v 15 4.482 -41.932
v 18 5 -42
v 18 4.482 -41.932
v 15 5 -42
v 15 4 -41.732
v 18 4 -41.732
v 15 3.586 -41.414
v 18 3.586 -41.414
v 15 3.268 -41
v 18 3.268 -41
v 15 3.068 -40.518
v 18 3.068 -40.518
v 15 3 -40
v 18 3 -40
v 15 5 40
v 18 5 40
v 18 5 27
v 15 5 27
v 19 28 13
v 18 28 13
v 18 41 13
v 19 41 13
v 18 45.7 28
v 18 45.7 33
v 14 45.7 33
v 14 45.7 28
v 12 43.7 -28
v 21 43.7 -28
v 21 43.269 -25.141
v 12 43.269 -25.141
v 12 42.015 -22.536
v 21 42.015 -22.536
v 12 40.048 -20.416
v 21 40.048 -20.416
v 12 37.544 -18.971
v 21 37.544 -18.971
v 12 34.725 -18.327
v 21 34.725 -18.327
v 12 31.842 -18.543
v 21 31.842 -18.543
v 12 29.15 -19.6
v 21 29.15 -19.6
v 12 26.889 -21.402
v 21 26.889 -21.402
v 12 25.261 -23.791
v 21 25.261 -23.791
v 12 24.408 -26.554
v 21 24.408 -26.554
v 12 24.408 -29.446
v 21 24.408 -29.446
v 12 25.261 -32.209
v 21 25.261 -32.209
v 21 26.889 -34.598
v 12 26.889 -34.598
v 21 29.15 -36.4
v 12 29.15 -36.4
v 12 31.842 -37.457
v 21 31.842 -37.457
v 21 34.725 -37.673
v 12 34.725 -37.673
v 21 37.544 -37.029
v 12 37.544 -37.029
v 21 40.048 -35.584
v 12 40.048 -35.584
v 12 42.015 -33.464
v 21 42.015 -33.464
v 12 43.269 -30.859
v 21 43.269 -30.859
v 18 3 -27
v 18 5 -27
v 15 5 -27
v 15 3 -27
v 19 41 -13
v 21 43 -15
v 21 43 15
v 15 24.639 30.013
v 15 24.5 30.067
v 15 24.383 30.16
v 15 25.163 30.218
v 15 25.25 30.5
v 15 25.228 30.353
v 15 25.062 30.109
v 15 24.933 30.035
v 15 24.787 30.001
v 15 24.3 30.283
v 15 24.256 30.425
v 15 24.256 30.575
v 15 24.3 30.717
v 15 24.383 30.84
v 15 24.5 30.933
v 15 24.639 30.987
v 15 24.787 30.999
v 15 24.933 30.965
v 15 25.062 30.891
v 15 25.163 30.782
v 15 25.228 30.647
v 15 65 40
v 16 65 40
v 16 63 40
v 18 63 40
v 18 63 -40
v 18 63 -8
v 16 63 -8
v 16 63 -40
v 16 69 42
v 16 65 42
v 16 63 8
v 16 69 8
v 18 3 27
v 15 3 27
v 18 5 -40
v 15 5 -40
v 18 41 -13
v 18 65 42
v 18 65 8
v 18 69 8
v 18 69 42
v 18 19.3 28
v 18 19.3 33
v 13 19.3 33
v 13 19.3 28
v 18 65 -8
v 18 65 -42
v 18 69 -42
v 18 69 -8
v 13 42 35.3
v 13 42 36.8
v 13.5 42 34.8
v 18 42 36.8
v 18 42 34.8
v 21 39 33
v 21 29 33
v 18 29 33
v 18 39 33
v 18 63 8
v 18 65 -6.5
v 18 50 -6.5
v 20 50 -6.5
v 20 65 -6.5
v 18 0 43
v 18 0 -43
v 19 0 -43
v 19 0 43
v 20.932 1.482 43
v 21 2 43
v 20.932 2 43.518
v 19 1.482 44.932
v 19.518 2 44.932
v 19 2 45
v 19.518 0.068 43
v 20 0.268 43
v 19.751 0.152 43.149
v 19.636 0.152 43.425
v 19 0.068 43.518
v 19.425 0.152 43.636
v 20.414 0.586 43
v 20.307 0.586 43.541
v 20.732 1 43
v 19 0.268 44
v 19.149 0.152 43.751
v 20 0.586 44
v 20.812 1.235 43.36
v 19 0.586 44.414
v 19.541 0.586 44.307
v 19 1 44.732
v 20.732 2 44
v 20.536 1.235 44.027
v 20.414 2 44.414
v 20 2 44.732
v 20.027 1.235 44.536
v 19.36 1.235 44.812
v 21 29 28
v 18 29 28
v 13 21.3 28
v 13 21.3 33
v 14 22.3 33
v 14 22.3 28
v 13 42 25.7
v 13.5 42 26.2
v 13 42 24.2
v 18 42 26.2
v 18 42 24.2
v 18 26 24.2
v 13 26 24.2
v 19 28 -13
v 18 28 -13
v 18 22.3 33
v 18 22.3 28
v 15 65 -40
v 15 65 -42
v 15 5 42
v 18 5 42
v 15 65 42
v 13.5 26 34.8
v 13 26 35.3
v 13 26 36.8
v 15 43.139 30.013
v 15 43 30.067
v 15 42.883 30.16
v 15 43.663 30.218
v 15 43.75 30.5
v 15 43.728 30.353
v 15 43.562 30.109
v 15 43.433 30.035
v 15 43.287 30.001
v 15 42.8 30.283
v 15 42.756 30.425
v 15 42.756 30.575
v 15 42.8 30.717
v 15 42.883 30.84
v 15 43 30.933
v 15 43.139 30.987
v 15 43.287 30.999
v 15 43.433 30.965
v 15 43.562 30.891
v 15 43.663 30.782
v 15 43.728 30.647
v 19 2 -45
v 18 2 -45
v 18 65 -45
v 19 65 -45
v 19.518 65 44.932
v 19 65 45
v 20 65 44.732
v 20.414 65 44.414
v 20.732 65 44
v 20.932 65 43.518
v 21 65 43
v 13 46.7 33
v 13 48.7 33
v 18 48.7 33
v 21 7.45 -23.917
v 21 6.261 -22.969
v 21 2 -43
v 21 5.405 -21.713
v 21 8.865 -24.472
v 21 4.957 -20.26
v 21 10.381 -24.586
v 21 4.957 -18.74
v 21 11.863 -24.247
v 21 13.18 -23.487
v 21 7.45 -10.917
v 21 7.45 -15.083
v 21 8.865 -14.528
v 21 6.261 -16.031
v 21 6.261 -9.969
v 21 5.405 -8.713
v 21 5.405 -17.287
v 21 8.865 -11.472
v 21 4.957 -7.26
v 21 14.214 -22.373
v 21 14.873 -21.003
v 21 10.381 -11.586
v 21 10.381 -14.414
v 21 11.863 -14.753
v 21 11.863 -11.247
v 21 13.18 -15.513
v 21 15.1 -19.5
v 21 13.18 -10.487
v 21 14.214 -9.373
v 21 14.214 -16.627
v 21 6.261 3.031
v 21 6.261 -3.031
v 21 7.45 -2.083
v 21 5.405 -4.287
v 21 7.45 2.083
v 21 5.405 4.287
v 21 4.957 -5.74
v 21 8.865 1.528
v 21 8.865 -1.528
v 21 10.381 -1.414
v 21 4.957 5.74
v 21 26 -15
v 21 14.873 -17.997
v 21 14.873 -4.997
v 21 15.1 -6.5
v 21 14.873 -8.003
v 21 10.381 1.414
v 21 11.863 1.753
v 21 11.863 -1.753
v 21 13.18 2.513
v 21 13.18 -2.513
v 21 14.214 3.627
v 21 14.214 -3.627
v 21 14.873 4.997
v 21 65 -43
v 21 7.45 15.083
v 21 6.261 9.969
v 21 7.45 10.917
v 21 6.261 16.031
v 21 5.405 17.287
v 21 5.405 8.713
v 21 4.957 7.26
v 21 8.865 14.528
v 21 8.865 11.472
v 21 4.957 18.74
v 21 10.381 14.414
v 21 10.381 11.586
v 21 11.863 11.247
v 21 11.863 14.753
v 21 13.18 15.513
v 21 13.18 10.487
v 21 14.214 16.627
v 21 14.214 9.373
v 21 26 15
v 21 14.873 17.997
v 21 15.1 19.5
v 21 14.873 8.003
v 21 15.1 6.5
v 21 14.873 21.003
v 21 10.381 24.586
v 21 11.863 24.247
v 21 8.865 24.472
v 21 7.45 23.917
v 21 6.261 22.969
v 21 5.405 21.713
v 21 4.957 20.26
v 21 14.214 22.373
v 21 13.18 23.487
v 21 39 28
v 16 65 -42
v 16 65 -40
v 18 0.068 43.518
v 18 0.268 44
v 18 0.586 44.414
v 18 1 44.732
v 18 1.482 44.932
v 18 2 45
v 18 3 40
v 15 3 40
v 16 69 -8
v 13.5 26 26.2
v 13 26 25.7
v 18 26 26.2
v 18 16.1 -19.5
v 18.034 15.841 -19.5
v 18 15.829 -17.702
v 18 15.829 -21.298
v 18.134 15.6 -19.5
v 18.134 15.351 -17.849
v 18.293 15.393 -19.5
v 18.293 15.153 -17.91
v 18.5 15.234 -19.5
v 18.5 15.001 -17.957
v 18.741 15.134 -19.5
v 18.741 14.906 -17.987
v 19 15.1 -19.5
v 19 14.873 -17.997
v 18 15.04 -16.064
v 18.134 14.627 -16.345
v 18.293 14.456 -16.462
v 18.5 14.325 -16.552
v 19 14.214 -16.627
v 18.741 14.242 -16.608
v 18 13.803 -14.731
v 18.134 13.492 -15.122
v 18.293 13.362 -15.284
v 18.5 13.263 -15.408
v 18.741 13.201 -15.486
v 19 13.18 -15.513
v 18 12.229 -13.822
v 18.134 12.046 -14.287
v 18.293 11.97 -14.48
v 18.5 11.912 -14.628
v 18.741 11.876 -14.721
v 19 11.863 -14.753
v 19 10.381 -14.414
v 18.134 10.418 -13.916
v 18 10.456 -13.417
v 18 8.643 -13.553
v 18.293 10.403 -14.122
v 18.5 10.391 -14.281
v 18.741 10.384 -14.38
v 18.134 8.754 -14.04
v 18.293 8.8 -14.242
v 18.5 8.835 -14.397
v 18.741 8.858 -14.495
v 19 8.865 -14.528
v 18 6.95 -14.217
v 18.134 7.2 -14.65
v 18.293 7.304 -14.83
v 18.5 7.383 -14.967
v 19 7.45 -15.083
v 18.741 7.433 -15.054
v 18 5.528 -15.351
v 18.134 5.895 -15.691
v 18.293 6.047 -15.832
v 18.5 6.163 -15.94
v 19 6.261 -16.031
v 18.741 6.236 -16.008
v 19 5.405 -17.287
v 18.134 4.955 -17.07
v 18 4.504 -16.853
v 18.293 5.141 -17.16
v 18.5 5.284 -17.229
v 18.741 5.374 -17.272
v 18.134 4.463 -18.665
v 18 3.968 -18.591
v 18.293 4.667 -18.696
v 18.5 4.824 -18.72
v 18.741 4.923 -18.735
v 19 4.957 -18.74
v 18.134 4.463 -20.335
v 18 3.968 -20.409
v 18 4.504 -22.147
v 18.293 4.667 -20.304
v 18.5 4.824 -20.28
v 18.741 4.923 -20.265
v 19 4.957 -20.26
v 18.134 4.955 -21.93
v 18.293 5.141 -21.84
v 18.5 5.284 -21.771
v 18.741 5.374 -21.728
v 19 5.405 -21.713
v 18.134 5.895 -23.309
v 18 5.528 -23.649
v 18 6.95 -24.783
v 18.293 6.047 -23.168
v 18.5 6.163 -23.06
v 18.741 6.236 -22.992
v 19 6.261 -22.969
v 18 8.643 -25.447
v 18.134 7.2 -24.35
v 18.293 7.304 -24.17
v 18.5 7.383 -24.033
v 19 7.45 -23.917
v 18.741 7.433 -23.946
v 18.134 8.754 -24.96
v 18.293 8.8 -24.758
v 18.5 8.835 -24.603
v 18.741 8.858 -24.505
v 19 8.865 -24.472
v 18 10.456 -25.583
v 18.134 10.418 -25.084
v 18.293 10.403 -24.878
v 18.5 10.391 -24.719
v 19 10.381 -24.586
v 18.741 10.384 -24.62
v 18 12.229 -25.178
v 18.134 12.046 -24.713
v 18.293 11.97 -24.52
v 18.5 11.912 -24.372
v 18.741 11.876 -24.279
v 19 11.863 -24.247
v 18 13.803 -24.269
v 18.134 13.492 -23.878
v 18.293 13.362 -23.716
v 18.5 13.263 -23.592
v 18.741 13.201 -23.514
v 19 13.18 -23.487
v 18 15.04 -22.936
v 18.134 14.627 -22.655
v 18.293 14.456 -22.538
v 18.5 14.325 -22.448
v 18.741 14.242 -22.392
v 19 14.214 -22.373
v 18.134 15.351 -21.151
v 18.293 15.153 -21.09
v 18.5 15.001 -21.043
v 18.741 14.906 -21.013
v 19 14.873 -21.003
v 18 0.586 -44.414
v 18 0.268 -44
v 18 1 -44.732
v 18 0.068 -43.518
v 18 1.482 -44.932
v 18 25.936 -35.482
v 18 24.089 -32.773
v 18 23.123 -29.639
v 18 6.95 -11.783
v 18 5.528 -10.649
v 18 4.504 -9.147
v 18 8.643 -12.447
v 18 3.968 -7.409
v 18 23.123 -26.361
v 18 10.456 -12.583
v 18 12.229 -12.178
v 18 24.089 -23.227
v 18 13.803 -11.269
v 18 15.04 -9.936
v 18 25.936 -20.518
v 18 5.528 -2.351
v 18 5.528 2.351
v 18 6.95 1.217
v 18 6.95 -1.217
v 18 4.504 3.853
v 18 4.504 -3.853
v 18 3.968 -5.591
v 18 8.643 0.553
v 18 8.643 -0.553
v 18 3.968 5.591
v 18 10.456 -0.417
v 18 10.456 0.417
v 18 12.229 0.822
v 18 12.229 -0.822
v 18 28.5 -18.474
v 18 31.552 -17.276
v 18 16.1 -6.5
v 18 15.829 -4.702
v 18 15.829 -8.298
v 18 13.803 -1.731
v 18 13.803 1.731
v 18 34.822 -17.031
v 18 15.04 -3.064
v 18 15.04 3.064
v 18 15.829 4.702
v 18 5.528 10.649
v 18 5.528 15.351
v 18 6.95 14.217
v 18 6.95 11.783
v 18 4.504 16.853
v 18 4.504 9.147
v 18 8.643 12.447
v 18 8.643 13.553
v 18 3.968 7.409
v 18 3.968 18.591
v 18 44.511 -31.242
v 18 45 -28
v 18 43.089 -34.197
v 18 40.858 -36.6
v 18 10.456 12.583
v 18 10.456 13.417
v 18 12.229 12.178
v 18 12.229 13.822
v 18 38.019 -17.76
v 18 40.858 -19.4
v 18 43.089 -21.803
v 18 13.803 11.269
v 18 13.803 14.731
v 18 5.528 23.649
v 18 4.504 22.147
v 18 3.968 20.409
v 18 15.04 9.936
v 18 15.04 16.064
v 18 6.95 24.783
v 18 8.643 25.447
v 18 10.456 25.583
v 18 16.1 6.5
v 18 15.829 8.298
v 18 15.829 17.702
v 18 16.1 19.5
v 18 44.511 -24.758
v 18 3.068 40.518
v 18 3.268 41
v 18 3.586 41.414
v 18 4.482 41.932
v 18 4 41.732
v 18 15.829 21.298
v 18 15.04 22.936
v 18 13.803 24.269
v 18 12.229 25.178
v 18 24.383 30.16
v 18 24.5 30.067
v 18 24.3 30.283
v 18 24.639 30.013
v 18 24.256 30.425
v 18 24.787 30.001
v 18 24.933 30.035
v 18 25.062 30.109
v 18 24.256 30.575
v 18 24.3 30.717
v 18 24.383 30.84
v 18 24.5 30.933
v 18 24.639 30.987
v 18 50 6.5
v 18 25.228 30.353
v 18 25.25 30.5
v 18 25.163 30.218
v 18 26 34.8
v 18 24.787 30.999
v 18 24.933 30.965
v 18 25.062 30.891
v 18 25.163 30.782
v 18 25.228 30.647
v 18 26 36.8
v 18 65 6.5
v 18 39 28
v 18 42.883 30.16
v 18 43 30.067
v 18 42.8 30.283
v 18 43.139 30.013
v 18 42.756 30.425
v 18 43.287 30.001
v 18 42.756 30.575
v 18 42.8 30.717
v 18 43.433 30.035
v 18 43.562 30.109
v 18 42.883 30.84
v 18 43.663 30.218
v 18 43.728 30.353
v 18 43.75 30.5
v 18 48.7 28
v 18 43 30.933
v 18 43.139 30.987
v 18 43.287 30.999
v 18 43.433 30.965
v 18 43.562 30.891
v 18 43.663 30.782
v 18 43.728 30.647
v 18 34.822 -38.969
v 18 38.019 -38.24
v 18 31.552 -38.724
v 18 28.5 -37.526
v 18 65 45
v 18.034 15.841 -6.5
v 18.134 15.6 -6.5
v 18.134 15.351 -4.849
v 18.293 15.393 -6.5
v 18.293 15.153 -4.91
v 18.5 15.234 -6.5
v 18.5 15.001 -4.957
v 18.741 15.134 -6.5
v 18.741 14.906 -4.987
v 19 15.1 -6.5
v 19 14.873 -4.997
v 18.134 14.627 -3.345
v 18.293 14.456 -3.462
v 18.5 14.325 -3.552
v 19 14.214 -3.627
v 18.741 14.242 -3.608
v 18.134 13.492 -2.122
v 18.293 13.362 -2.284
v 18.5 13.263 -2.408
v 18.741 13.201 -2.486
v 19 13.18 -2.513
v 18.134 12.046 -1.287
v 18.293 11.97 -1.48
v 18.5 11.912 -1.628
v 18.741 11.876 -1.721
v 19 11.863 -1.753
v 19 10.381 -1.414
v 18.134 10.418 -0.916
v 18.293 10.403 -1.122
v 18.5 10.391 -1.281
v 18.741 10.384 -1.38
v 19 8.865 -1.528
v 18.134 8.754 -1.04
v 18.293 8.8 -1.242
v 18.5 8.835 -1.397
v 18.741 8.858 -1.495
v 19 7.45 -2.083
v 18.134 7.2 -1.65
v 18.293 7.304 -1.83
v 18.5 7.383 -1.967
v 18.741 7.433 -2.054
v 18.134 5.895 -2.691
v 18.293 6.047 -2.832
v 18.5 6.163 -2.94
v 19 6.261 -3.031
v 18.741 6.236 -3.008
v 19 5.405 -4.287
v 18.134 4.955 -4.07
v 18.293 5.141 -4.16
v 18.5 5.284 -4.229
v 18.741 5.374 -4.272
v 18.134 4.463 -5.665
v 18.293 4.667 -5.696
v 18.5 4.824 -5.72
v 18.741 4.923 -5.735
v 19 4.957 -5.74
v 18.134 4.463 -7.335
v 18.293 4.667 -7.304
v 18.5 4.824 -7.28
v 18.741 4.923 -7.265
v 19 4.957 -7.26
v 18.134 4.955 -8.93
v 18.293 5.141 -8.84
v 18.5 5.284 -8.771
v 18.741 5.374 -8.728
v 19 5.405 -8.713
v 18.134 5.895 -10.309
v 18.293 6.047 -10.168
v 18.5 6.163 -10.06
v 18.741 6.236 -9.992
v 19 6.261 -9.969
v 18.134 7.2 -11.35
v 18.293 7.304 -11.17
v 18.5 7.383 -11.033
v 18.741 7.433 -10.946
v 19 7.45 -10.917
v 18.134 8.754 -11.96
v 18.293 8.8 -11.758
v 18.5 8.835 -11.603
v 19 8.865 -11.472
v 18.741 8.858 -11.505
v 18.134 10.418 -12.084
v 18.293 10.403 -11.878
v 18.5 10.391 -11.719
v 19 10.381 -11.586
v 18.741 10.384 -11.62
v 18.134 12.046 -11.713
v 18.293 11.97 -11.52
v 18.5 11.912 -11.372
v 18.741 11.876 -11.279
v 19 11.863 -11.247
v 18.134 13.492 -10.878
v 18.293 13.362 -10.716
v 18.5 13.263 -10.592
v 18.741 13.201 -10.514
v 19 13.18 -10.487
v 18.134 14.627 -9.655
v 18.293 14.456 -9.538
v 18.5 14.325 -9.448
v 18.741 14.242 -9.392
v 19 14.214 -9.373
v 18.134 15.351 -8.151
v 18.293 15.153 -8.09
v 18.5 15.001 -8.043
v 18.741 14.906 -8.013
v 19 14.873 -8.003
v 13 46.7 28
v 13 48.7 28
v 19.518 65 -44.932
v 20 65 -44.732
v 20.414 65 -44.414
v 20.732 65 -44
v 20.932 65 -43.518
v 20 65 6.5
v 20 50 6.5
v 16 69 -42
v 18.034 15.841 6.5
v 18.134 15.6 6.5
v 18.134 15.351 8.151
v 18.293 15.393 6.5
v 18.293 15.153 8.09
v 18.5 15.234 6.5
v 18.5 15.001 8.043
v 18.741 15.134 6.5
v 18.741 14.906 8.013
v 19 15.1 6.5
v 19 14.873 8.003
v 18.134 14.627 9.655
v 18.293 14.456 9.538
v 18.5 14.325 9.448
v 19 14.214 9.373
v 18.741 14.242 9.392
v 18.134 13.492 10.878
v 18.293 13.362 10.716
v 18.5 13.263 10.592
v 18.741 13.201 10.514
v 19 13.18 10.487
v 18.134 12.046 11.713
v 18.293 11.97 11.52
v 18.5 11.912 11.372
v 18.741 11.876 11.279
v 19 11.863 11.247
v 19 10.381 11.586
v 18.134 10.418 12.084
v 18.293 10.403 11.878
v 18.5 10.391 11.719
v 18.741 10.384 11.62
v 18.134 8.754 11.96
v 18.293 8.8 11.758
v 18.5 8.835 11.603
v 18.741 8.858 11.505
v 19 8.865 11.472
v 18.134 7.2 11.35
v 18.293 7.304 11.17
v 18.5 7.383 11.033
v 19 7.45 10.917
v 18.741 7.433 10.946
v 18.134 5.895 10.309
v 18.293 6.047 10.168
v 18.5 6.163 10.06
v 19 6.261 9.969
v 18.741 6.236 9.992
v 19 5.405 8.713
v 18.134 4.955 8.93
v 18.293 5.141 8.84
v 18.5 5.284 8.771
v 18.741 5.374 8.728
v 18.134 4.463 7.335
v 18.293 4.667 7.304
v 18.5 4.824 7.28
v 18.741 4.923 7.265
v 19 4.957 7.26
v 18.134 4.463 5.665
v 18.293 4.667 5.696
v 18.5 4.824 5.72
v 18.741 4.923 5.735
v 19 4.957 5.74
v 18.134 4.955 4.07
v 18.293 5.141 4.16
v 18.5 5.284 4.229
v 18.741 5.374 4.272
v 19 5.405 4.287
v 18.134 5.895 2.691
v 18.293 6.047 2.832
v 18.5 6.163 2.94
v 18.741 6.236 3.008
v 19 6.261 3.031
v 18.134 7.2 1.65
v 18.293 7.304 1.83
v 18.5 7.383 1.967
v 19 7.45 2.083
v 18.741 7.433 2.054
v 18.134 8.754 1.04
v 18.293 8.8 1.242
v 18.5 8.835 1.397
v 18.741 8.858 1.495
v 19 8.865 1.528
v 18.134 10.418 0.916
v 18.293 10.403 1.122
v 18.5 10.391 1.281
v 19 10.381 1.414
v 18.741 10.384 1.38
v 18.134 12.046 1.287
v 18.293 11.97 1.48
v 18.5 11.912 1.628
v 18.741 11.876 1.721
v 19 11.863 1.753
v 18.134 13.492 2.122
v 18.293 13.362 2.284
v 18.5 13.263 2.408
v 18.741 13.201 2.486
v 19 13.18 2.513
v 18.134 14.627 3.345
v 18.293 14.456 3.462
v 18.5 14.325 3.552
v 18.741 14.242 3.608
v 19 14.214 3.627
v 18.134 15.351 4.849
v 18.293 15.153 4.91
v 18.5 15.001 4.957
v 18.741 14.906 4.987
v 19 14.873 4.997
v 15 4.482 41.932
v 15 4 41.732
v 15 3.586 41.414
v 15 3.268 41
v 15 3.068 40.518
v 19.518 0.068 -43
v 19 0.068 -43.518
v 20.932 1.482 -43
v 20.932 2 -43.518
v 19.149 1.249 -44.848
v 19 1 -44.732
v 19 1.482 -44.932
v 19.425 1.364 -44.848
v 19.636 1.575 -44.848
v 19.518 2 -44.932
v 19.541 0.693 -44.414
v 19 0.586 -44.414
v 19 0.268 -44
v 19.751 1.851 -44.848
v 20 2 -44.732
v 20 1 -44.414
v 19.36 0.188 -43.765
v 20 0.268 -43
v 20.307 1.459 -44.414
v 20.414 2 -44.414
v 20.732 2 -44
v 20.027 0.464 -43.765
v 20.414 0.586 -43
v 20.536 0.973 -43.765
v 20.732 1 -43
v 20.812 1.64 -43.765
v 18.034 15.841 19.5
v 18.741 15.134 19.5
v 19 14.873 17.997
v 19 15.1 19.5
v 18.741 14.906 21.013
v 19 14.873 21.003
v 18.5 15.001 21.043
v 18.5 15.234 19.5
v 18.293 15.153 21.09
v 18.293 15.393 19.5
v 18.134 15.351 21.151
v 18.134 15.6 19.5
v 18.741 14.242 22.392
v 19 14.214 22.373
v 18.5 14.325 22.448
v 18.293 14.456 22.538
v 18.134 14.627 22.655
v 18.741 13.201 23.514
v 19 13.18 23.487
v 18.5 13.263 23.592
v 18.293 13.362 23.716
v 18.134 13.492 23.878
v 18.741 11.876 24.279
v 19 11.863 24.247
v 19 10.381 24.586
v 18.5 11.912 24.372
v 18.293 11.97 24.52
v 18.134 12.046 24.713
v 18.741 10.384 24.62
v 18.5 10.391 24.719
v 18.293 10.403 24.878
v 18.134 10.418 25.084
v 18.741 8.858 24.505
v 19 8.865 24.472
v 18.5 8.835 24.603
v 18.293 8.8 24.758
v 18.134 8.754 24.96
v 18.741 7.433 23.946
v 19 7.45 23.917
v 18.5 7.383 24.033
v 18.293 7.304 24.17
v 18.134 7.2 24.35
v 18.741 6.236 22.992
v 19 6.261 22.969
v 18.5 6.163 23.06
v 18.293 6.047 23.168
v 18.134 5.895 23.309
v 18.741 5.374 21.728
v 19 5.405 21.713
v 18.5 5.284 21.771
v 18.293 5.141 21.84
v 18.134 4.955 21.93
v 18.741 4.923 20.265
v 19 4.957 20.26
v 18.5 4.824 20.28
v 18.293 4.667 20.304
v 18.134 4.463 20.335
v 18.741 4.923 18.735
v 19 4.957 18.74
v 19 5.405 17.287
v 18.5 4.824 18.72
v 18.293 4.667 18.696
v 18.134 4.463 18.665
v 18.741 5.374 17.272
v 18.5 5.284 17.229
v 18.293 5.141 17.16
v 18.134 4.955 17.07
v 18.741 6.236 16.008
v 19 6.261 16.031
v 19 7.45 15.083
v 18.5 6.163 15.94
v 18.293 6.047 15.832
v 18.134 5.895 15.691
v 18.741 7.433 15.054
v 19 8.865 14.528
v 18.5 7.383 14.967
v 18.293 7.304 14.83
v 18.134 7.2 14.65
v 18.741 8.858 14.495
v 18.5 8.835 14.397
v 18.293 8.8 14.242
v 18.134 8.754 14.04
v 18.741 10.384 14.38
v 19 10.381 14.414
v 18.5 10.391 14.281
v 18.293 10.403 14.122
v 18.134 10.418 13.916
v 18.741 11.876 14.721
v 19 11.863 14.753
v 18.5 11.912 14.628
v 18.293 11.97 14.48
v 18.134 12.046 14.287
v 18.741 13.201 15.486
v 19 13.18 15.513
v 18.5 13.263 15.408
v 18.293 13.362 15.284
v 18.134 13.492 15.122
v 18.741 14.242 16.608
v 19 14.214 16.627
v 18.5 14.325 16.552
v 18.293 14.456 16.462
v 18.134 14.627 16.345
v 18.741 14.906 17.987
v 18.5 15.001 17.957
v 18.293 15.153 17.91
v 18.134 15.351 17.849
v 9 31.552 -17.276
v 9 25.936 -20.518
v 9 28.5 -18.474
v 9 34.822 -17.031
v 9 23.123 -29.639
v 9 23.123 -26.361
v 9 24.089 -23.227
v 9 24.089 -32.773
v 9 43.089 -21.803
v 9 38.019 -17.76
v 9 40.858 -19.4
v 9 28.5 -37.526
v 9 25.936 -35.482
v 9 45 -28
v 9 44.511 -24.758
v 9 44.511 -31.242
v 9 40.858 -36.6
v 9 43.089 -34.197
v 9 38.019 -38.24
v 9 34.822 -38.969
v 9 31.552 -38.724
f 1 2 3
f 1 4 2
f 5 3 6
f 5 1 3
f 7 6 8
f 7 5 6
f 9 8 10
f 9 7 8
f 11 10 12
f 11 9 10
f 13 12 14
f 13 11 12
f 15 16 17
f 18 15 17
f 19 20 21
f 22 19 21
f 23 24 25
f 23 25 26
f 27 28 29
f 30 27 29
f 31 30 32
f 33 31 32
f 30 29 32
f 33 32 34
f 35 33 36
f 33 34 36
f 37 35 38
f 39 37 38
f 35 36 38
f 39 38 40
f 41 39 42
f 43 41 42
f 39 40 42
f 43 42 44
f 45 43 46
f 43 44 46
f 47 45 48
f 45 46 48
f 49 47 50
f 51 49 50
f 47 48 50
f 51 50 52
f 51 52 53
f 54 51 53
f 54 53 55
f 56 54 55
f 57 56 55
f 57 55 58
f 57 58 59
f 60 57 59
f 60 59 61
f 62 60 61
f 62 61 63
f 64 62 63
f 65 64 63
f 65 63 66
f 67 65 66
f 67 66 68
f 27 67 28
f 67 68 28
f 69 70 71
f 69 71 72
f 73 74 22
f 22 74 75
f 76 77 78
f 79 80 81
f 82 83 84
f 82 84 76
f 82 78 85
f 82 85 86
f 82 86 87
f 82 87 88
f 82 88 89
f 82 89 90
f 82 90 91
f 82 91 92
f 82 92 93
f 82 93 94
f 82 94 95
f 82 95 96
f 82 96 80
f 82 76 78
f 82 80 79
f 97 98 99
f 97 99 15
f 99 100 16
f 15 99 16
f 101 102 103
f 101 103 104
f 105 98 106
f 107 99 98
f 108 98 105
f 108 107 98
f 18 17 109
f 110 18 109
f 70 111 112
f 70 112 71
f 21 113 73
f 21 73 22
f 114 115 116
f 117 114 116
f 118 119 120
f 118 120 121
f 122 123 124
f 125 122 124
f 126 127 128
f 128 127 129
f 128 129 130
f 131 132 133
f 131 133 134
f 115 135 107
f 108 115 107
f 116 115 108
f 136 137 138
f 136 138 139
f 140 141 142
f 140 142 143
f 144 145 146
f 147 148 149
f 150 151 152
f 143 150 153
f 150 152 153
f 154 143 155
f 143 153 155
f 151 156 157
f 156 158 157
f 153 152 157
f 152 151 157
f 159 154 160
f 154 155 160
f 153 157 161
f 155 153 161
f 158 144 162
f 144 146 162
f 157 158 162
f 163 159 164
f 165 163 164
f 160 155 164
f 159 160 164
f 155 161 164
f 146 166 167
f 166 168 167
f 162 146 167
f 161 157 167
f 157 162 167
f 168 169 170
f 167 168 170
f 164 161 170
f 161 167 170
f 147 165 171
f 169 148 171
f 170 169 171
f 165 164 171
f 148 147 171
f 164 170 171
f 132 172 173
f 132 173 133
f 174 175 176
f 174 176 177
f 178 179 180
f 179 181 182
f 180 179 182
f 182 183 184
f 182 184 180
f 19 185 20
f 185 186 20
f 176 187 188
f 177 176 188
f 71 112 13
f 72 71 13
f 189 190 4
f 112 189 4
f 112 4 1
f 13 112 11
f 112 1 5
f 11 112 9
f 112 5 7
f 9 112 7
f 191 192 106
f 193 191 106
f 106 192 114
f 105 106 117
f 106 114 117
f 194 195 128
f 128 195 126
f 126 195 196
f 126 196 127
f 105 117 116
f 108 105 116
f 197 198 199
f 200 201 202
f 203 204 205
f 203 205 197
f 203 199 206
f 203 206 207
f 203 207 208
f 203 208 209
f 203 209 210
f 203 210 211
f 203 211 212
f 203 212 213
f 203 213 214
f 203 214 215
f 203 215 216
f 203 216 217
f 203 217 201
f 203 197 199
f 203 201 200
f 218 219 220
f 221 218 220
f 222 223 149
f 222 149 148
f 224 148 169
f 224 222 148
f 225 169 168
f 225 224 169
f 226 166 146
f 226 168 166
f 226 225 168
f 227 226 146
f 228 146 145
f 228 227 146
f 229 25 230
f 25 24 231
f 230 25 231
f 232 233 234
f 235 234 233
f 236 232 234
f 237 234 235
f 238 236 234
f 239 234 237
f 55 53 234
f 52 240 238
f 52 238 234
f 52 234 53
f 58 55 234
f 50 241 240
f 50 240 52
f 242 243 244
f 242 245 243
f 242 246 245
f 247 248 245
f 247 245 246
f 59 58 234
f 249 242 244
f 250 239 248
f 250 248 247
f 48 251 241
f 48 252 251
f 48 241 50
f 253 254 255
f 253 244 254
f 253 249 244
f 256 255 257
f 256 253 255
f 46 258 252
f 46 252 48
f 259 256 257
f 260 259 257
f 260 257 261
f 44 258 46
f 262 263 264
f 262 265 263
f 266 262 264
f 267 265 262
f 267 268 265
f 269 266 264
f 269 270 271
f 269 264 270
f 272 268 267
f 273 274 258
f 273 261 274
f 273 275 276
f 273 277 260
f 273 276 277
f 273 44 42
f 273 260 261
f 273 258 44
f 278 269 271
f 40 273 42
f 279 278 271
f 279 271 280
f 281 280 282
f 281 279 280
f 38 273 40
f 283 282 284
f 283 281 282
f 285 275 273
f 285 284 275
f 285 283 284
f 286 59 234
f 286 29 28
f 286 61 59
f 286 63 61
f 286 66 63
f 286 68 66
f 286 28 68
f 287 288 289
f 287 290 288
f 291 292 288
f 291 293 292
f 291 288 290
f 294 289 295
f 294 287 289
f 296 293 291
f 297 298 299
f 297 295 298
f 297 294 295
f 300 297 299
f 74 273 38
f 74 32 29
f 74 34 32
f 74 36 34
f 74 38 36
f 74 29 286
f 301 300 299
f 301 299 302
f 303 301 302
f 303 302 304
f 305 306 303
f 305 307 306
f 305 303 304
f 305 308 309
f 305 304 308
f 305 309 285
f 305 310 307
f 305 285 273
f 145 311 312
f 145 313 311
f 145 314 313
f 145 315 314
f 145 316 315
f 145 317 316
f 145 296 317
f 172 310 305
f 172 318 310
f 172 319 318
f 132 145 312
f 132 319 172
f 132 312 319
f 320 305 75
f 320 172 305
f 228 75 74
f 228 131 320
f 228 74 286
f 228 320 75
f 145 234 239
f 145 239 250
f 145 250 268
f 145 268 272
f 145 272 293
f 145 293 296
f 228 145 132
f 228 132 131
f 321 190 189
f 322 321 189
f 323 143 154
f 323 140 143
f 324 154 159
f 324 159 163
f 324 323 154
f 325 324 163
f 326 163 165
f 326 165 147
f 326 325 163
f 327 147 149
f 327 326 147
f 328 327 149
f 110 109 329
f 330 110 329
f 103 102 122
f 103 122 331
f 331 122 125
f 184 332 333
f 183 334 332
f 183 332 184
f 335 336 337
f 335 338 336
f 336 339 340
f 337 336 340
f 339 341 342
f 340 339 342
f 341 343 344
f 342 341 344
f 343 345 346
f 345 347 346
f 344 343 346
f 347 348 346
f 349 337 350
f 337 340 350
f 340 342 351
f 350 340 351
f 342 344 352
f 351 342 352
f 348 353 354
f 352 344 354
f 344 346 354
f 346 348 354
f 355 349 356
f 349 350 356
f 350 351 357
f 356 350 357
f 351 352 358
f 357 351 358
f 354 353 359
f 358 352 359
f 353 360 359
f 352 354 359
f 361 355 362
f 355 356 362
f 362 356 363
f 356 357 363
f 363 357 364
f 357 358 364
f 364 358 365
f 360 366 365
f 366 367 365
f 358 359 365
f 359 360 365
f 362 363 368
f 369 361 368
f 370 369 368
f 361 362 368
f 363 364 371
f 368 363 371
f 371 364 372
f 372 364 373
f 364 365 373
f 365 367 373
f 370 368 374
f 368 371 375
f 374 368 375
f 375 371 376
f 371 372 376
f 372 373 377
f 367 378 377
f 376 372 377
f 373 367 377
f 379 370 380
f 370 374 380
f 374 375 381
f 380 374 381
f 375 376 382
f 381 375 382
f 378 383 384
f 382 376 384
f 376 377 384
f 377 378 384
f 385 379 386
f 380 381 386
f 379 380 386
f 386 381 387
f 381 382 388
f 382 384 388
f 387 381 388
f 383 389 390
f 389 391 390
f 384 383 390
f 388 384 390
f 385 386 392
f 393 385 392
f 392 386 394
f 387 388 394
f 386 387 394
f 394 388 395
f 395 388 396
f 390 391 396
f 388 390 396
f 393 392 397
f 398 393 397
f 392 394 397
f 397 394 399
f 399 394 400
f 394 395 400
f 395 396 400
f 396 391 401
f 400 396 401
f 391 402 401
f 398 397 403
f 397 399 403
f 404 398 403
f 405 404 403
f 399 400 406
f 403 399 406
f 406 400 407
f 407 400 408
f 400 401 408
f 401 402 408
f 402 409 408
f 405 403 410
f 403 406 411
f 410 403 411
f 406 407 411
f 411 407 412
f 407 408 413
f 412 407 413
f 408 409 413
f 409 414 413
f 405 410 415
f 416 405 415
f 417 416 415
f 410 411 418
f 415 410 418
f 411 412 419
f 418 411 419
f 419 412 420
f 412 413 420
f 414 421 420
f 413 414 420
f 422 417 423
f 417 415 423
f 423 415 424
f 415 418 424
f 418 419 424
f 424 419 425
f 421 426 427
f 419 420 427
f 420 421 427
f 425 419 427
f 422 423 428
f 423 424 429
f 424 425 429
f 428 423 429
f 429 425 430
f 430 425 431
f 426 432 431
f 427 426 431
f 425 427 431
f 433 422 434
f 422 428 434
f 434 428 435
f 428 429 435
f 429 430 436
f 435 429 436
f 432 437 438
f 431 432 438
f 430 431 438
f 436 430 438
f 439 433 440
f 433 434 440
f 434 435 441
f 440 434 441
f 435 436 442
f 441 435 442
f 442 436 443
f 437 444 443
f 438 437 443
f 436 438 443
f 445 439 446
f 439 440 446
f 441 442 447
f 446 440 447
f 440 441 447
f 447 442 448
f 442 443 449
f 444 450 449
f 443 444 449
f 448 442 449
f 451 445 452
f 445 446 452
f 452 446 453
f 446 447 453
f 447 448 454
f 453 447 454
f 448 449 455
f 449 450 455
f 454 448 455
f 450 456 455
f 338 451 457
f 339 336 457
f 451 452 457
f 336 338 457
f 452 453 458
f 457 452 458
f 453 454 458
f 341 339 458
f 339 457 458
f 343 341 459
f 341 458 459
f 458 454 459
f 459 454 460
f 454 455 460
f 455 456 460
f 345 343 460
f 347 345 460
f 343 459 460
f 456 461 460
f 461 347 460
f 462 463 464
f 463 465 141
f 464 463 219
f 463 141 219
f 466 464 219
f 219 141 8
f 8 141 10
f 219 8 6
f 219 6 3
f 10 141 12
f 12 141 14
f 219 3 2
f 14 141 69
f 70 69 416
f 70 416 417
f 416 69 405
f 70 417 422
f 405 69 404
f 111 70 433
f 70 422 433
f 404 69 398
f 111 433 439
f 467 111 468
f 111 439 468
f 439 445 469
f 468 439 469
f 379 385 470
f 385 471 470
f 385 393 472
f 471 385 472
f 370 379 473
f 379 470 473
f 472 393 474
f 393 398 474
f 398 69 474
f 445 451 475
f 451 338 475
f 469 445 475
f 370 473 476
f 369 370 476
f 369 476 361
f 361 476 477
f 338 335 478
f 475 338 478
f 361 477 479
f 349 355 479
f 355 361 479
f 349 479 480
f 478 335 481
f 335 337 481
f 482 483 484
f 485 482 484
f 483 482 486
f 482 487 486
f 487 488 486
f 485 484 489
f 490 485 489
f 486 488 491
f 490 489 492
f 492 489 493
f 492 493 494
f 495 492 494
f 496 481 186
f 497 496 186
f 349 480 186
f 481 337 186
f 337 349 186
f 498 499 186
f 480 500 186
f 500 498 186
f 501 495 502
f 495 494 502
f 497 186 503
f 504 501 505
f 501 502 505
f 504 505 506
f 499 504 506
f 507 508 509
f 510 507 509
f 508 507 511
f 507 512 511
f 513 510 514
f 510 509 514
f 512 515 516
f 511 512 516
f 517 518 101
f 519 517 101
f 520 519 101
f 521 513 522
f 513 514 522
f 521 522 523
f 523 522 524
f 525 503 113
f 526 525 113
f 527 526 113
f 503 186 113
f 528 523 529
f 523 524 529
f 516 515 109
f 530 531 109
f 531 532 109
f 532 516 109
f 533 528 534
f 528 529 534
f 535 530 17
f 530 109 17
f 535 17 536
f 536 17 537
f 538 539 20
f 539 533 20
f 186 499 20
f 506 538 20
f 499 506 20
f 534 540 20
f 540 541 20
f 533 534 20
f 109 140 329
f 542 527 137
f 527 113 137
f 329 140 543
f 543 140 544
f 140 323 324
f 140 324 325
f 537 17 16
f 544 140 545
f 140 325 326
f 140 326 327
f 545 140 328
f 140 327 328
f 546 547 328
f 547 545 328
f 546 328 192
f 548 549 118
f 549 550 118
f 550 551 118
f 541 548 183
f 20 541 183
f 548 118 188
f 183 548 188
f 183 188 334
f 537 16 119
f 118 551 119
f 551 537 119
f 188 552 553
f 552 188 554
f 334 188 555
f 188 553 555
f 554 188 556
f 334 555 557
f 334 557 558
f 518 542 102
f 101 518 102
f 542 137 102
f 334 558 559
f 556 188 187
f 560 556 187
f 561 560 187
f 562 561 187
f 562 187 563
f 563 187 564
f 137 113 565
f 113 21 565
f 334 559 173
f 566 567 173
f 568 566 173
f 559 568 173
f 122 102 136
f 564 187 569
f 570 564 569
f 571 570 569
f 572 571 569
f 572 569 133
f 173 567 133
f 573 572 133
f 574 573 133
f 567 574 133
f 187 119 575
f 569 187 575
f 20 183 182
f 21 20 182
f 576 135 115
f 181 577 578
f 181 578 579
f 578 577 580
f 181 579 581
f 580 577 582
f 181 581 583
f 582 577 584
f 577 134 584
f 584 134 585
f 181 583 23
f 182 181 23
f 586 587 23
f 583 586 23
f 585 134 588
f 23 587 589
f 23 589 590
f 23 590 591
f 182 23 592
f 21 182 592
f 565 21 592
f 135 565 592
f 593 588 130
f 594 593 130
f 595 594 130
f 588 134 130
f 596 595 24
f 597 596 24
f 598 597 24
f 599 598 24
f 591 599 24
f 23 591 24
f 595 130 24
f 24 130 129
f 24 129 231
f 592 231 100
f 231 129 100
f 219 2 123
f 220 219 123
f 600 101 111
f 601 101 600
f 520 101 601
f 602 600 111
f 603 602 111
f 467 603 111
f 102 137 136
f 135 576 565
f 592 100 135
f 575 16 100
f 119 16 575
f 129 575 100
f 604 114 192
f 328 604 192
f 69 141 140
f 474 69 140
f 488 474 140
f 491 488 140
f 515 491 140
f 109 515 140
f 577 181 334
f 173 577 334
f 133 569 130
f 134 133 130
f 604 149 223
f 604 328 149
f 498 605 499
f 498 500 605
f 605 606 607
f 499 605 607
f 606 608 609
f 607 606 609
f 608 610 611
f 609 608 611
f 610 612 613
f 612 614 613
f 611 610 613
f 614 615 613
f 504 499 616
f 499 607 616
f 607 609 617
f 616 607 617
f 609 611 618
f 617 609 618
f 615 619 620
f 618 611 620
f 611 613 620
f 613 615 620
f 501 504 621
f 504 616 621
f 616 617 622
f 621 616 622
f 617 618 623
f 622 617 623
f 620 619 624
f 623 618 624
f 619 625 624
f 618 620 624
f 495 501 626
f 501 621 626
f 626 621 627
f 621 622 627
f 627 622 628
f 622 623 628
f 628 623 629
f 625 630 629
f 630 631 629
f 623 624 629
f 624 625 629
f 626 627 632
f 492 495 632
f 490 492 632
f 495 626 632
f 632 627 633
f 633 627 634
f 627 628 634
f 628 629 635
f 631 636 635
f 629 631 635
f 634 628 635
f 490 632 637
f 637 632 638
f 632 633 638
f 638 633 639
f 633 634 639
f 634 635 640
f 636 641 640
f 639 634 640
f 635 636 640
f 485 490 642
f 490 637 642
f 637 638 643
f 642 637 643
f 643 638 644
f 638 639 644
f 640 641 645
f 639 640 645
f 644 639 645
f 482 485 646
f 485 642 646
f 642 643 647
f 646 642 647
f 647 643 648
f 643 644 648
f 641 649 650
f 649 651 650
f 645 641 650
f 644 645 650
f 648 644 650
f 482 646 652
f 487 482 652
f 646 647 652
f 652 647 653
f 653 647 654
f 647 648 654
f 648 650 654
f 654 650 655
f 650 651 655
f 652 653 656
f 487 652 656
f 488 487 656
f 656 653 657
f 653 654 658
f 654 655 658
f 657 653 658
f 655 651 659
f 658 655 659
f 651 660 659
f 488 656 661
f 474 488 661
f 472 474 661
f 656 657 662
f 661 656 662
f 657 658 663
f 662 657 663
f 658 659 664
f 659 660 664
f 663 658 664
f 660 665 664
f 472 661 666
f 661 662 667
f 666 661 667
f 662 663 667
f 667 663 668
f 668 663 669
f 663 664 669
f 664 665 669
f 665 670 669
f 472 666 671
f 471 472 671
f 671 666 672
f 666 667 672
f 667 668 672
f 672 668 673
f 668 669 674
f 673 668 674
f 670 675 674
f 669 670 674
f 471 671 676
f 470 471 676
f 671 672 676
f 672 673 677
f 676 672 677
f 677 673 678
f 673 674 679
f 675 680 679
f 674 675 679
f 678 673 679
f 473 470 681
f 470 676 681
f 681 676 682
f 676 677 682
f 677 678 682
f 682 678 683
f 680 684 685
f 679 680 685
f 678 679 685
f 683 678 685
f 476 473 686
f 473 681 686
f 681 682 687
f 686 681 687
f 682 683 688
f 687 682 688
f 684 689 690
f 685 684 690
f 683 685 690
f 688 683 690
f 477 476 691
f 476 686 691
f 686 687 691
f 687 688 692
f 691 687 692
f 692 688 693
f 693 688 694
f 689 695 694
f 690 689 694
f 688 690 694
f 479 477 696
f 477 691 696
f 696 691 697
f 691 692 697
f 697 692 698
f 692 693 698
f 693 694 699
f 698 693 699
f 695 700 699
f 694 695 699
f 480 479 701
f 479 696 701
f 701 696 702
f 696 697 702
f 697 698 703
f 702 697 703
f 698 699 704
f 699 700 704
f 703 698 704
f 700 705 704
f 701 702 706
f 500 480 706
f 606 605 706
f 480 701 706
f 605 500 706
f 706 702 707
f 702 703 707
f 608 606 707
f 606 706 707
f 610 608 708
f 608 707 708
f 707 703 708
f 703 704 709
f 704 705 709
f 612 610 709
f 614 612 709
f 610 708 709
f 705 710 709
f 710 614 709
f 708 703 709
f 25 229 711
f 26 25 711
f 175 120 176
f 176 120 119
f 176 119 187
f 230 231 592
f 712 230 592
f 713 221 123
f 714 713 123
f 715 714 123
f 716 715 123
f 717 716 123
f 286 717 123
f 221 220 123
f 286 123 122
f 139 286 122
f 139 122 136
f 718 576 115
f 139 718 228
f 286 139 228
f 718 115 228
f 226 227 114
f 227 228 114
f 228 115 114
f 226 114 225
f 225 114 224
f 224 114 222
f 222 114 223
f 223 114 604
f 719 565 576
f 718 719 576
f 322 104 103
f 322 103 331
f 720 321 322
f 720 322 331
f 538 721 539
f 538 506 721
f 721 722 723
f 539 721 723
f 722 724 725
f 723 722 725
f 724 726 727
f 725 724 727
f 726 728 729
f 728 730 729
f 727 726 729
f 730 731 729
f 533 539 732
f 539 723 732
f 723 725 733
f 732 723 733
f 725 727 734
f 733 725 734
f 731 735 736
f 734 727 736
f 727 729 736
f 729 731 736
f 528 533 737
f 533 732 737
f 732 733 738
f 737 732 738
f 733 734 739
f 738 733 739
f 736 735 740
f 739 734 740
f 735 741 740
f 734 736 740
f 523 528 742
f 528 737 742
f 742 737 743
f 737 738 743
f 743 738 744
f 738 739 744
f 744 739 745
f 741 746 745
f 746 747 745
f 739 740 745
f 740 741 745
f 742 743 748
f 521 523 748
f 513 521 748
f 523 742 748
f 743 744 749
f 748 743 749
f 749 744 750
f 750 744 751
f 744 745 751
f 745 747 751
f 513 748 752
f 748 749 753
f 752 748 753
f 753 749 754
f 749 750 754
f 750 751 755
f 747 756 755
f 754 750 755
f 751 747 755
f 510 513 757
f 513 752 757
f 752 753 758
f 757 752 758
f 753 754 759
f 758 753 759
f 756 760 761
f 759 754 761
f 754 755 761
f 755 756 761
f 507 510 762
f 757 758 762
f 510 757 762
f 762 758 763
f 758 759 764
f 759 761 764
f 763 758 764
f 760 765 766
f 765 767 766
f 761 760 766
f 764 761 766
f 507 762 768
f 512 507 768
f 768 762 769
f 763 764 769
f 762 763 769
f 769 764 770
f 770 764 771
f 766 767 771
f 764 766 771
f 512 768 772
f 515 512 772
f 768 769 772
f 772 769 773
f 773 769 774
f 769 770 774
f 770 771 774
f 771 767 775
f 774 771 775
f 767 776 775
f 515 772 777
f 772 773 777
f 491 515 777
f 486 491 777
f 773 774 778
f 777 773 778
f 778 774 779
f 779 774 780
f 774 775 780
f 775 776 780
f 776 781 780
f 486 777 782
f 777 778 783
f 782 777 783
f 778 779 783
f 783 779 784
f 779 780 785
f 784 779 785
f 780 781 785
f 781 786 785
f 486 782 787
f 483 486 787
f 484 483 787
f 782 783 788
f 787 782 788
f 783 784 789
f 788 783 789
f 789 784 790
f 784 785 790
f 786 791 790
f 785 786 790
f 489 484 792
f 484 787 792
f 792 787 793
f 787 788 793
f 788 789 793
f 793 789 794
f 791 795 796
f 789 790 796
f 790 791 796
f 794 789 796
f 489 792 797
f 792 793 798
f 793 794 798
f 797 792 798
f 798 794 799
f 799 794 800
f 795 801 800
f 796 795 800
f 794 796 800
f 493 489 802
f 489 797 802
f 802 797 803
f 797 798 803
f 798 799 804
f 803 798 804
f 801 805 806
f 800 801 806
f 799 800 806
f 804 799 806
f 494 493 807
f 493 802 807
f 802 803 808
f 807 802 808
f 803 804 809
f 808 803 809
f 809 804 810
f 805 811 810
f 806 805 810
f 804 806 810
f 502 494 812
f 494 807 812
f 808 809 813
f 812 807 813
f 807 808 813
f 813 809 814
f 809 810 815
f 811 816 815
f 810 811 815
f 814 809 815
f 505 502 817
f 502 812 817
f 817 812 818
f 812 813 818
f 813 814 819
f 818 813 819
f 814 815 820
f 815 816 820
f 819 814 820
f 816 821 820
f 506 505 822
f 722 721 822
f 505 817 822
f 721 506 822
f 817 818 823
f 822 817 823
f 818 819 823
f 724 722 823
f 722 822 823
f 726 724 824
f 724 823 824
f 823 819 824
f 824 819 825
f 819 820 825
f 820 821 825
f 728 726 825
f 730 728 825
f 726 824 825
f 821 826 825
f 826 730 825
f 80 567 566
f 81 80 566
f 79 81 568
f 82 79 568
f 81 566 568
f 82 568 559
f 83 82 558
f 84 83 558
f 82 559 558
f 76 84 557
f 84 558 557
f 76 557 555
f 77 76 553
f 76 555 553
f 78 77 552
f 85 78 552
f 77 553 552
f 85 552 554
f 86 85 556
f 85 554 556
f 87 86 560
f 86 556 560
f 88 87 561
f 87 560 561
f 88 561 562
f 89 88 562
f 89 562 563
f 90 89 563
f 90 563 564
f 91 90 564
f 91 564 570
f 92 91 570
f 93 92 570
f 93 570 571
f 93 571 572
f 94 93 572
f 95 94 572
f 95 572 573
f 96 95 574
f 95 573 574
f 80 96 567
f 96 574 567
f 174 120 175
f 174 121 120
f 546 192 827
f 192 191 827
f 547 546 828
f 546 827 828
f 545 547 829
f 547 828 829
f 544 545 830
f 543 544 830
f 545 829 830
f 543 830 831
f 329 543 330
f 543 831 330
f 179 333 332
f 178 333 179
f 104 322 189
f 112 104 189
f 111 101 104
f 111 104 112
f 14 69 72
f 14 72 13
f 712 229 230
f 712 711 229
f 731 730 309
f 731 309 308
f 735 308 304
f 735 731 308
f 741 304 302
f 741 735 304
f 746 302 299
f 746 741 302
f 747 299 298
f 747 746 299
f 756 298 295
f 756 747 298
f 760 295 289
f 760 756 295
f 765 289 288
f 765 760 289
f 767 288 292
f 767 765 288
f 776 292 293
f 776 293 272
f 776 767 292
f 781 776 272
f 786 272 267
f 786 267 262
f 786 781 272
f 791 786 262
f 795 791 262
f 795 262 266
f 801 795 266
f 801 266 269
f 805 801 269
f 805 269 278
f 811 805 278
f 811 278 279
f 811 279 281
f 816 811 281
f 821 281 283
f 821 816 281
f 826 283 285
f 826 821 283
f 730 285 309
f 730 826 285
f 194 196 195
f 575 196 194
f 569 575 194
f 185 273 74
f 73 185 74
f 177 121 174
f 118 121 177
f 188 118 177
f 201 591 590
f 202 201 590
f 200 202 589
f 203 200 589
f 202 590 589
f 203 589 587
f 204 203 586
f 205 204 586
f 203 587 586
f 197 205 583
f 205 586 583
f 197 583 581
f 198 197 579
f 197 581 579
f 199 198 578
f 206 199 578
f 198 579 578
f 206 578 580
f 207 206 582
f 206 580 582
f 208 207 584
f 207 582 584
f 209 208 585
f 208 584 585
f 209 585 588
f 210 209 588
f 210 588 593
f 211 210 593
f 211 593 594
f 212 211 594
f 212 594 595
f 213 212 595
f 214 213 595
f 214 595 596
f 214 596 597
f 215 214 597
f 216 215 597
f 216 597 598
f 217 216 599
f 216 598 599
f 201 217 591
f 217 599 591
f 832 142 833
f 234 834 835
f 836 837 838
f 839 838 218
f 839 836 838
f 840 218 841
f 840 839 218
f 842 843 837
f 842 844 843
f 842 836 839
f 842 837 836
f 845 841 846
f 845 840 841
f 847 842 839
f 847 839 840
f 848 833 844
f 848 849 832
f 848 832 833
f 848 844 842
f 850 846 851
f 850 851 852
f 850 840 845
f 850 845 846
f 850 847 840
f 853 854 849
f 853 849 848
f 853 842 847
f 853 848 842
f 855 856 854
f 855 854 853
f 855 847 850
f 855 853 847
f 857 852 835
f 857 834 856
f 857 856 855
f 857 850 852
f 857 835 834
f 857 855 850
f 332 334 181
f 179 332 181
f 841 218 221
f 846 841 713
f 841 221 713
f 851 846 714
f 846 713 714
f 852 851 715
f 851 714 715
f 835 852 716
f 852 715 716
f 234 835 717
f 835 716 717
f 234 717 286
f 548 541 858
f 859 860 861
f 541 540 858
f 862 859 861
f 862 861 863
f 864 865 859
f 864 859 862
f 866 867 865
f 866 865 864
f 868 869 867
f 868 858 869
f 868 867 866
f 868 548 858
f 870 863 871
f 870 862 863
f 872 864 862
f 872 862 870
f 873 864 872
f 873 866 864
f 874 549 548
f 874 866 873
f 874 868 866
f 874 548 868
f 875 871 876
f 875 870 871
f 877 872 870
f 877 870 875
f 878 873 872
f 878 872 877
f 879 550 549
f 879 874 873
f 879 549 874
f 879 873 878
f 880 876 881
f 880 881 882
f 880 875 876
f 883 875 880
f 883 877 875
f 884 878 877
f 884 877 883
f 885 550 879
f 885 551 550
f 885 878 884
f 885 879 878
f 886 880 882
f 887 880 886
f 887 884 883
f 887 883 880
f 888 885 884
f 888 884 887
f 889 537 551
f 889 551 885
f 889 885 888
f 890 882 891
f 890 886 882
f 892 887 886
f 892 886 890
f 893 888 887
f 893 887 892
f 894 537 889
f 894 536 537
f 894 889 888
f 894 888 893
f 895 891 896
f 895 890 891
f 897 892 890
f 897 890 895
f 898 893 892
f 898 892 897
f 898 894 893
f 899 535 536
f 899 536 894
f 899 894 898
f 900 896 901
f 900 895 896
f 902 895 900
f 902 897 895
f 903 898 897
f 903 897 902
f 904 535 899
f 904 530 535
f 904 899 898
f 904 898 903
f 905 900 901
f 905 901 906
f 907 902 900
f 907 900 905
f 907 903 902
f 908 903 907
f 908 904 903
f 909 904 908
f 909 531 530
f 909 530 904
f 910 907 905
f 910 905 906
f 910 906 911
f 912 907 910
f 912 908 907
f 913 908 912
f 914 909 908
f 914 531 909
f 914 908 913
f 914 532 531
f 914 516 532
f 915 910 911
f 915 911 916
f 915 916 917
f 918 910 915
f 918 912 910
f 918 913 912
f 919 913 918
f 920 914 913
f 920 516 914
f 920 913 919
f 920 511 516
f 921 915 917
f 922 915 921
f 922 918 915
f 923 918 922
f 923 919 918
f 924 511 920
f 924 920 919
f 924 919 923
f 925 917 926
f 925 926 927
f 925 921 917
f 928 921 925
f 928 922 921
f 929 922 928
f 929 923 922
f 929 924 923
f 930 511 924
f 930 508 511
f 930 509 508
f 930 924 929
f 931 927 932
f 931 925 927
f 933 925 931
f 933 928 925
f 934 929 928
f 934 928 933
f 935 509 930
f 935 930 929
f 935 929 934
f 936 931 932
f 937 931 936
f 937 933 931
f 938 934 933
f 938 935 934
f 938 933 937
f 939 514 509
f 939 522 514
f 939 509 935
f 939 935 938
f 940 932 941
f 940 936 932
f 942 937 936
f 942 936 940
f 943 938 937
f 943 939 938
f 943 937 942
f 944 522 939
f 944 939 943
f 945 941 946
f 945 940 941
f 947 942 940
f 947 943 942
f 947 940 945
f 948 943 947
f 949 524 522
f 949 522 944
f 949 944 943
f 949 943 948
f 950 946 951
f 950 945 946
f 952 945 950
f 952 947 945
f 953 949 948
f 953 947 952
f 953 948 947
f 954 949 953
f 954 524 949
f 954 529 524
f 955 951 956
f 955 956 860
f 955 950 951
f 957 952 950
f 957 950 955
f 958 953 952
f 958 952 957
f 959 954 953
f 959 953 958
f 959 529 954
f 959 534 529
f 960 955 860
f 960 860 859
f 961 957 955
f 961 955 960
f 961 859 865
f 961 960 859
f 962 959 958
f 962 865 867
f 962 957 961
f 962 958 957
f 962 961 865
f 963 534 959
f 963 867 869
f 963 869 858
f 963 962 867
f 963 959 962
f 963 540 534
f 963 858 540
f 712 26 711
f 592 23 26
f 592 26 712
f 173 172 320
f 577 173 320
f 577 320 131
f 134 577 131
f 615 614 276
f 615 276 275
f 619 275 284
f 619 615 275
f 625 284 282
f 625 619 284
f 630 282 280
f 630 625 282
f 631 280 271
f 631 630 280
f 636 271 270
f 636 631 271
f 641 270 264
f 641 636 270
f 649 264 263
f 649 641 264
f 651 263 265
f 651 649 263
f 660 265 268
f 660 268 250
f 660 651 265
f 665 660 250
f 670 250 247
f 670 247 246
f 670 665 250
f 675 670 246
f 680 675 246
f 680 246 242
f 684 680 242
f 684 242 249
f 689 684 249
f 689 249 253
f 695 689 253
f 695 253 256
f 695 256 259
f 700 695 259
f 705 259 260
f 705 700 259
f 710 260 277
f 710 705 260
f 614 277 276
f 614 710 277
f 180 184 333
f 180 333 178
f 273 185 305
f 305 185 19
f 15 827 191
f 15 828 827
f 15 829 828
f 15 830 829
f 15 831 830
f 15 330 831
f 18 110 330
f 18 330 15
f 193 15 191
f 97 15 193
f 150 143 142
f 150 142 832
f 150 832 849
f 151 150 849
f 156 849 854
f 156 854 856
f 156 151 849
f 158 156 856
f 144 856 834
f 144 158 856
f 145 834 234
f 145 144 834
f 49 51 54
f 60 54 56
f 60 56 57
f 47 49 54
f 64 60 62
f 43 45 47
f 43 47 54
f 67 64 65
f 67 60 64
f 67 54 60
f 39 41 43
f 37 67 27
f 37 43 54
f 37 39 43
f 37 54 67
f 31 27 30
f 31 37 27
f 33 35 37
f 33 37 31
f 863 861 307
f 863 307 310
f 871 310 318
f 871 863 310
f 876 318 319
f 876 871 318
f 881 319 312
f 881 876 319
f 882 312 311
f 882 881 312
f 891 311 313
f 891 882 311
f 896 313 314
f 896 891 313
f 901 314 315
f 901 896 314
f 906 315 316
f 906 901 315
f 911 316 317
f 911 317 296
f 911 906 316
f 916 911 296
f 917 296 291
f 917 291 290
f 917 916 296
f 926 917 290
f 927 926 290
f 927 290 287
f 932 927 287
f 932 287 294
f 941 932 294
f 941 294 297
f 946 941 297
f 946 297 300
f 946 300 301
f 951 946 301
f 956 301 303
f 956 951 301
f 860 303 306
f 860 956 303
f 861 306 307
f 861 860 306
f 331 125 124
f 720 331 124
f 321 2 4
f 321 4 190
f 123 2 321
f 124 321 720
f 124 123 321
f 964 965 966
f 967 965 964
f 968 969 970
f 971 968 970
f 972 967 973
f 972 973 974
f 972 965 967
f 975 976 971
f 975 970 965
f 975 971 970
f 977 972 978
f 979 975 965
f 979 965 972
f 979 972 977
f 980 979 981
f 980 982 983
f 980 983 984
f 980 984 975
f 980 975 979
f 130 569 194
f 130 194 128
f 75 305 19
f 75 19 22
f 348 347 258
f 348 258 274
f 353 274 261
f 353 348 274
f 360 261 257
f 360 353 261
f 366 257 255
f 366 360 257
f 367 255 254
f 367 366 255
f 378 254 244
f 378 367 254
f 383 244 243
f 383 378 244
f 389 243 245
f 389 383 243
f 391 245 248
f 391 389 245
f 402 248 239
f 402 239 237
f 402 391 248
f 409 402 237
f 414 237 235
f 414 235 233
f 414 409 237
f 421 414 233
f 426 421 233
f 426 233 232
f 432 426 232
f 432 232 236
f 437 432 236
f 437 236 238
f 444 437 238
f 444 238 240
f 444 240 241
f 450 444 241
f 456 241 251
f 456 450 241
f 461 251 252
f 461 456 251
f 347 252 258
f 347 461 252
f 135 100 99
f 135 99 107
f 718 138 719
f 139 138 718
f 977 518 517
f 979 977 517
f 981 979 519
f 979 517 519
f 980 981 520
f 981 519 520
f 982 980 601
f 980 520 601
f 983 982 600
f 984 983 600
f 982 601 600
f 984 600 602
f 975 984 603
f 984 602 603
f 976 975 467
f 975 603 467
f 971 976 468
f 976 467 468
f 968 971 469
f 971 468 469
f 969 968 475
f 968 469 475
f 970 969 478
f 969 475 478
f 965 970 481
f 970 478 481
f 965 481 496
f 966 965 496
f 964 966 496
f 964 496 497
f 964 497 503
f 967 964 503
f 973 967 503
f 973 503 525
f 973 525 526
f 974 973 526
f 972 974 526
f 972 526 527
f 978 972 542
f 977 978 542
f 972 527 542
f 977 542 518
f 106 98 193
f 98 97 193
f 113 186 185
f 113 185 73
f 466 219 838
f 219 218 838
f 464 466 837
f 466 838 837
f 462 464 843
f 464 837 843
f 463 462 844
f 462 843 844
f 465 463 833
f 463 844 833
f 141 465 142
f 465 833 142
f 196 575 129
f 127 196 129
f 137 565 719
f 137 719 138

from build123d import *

# Parameters (mm, degrees)
SKETCH014_W     = 65
SKETCH014_H     = 90
SKETCH014_R     = 5.1
SKETCH014_W_2   = 13
SKETCH014_H_2   = 26
PAD010_DEPTH    = 3
SKETCH015_W     = 15
SKETCH015_H     = 13
POCKET004_DEPTH = 2
PAD011_DEPTH    = 3
FILLET009_R     = 2
FILLET010_R     = 2
FILLET011_R     = 2
CHAMFER008_SIZE = 2
CHAMFER009_SIZE = 2
CHAMFER010_SIZE = 2
CHAMFER011_SIZE = 2
FILLET012_R     = 1
FILLET013_R     = 1
FILLET014_R     = 1
FILLET015_R     = 1
FILLET016_R     = 2
FILLET017_R     = 2
SKETCH017_R     = 11
PAD012_DEPTH    = 9
SKETCH019_R     = 9.7
POCKET005_DEPTH = 9
SKETCH020_W     = 10
SKETCH020_H     = 5
POCKET006_DEPTH = 3
SKETCH021_R     = 0.5
PAD013_DEPTH    = 3
SKETCH022_W     = 3
SKETCH022_H     = 5
SKETCH022_W_2   = 16
SKETCH022_H_2   = 2
PAD014_DEPTH    = 5
CHAMFER012_SIZE = 1
CHAMFER013_SIZE = 0.5
CHAMFER014_SIZE = 0.5
CHAMFER015_SIZE = 1
SKETCH023_W     = 6
SKETCH023_H     = 34
PAD015_DEPTH    = 2


with BuildPart() as part:
    # Sketch014 → Pad010 (new body)
    with BuildSketch(Plane.YZ):
        with Locations((32.5, 0)):
            Rectangle(SKETCH014_W, SKETCH014_H)
        with Locations((10, 19.5)):
            Circle(SKETCH014_R, mode=Mode.SUBTRACT)
        with Locations((10, 6.5)):
            Circle(SKETCH014_R, mode=Mode.SUBTRACT)
        with Locations((10, -6.5)):
            Circle(SKETCH014_R, mode=Mode.SUBTRACT)
        with Locations((10, -19.5)):
            Circle(SKETCH014_R, mode=Mode.SUBTRACT)
        with Locations((34.5, 0)):
            Rectangle(SKETCH014_W_2, SKETCH014_H_2, mode=Mode.SUBTRACT)
    extrude(amount=PAD010_DEPTH)

    # Sketch015 (on Face13 of Pad010) → Pocket004 (cut)
    with BuildSketch(Plane(origin=(0, 0, 0), x_dir=(0, 1, 0), z_dir=(-1, 0, 0))):
        with Locations((57.5, 0)):
            Rectangle(SKETCH015_W, SKETCH015_H)
    extrude(amount=-POCKET004_DEPTH, mode=Mode.SUBTRACT)

    # Sketch016 (on Face4 of Pocket004) → Pad011 (join)
    with BuildSketch(Plane(origin=(0, 0, 0), x_dir=(0, 1, 0), z_dir=(-1, 0, 0))):
        Polygon((3, 27), (3, 42), (65, 42), (65, 40), (5, 40), (5, 27), align=None)
        Polygon((3, -27), (3, -42), (65, -42), (65, -40), (5, -40), (5, -27), align=None)
    extrude(amount=PAD011_DEPTH)

    # Fillet009
    fillet009_edges = [part.edges().sort_by_distance(p)[0] for p in [
        (3, 32.5, 45),
    ]]
    fillet(fillet009_edges, radius=FILLET009_R)

    # Fillet010
    fillet010_edges = [part.edges().sort_by_distance(p)[0] for p in [
        (3, 0, -1),
    ]]
    fillet(fillet010_edges, radius=FILLET010_R)

    # Fillet011
    fillet011_edges = [part.edges().sort_by_distance(p)[0] for p in [
        (3, 33.5, -45),
    ]]
    fillet(fillet011_edges, radius=FILLET011_R)

    # Chamfer008
    chamfer008_edges = [part.edges().sort_by_distance(p)[0] for p in [
        (3, 41, 0),
    ]]
    chamfer(chamfer008_edges, length=CHAMFER008_SIZE)

    # Chamfer009
    chamfer009_edges = [part.edges().sort_by_distance(p)[0] for p in [
        (3, 34.5, 13),
    ]]
    chamfer(chamfer009_edges, length=CHAMFER009_SIZE)

    # Chamfer010
    chamfer010_edges = [part.edges().sort_by_distance(p)[0] for p in [
        (3, 35.5, -13),
    ]]
    chamfer(chamfer010_edges, length=CHAMFER010_SIZE)

    # Chamfer011
    chamfer011_edges = [part.edges().sort_by_distance(p)[0] for p in [
        (3, 28, 1),
    ]]
    chamfer(chamfer011_edges, length=CHAMFER011_SIZE)

    # Fillet012
    fillet012_edges = [part.edges().sort_by_distance(p)[0] for p in [
        (0, 4.9, 19.5),
    ]]
    fillet(fillet012_edges, radius=FILLET012_R)

    # Fillet013
    fillet013_edges = [part.edges().sort_by_distance(p)[0] for p in [
        (0, 4.9, 6.5),
    ]]
    fillet(fillet013_edges, radius=FILLET013_R)

    # Fillet014
    fillet014_edges = [part.edges().sort_by_distance(p)[0] for p in [
        (0, 4.9, -6.5),
    ]]
    fillet(fillet014_edges, radius=FILLET014_R)

    # Fillet015
    fillet015_edges = [part.edges().sort_by_distance(p)[0] for p in [
        (0, 4.9, -19.5),
    ]]
    fillet(fillet015_edges, radius=FILLET015_R)

    # Fillet016
    fillet016_edges = [part.edges().sort_by_distance(p)[0] for p in [
        (-1.5, 3, 42),
    ]]
    fillet(fillet016_edges, radius=FILLET016_R)

    # Fillet017
    fillet017_edges = [part.edges().sort_by_distance(p)[0] for p in [
        (-1.5, 3, -42),
    ]]
    fillet(fillet017_edges, radius=FILLET017_R)

    # Sketch017 (on Face1 of Fillet017) → Pad012 (join)
    with BuildSketch(Plane(origin=(0, 0, 0), x_dir=(0, 1, 0), z_dir=(-1, 0, 0))):
        with Locations((34, 28)):
            Circle(SKETCH017_R)
    extrude(amount=PAD012_DEPTH)

    # Sketch019 (on Face33 of Pad012) → Pocket005 (cut)
    with BuildSketch(Plane.YZ.offset(3)):
        with Locations((34, -28)):
            Circle(SKETCH019_R)
    extrude(amount=-POCKET005_DEPTH, mode=Mode.SUBTRACT)

    # Sketch020 (on Face33 of Pocket005) → Pocket006 (cut)
    with BuildSketch(Plane.YZ.offset(3)):
        with Locations((34, 30.5)):
            Rectangle(SKETCH020_W, SKETCH020_H)
    extrude(amount=-POCKET006_DEPTH, mode=Mode.SUBTRACT)

    # Sketch021 (on Face1 of Pocket006) → Pad013 (join)
    with BuildSketch(Plane(origin=(0, 0, 0), x_dir=(0, 1, 0), z_dir=(-1, 0, 0))):
        with Locations((43.25, -30.5)):
            Circle(SKETCH021_R)
        with Locations((24.75, -30.5)):
            Circle(SKETCH021_R)
    extrude(amount=PAD013_DEPTH)

    # Sketch022 (on Face1 of Pad013) → Pad014 (join)
    with BuildSketch(Plane(origin=(0, 0, 0), x_dir=(0, 1, 0), z_dir=(-1, 0, 0))):
        with Locations((47.2, -30.5)):
            Rectangle(SKETCH022_W, SKETCH022_H)
        with Locations((20.8, -30.5)):
            Rectangle(SKETCH022_W, SKETCH022_H)
        with Locations((34, -25.2)):
            Rectangle(SKETCH022_W_2, SKETCH022_H_2)
        with Locations((34, -35.8)):
            Rectangle(SKETCH022_W_2, SKETCH022_H_2)
    extrude(amount=PAD014_DEPTH)

    # Chamfer012
    chamfer012_edges = [part.edges().sort_by_distance(p)[0] for p in [
        (-5, 45.7, 30.5),
    ]]
    chamfer(chamfer012_edges, length=CHAMFER012_SIZE)

    # Chamfer013
    chamfer013_edges = [part.edges().sort_by_distance(p)[0] for p in [
        (-5, 34, 26.2),
    ]]
    chamfer(chamfer013_edges, length=CHAMFER013_SIZE)

    # Chamfer014
    chamfer014_edges = [part.edges().sort_by_distance(p)[0] for p in [
        (-5, 34, 34.8),
    ]]
    chamfer(chamfer014_edges, length=CHAMFER014_SIZE)

    # Chamfer015
    chamfer015_edges = [part.edges().sort_by_distance(p)[0] for p in [
        (-5, 22.3, 30.5),
    ]]
    chamfer(chamfer015_edges, length=CHAMFER015_SIZE)

    # Sketch023 (on Face4 of Chamfer015) → Pad015 (join)
    with BuildSketch(Plane(origin=(0, 0, 0), x_dir=(0, 1, 0), z_dir=(-1, 0, 0))):
        with Locations((66, 25)):
            Rectangle(SKETCH023_W, SKETCH023_H)
        with Locations((66, -25)):
            Rectangle(SKETCH023_W, SKETCH023_H)
    extrude(amount=PAD015_DEPTH)


with BuildPart() as part_1:
    # Body002 placement: moved
    add(part.part.moved(Location((18, 0, 0))))


solid = part_1.part
